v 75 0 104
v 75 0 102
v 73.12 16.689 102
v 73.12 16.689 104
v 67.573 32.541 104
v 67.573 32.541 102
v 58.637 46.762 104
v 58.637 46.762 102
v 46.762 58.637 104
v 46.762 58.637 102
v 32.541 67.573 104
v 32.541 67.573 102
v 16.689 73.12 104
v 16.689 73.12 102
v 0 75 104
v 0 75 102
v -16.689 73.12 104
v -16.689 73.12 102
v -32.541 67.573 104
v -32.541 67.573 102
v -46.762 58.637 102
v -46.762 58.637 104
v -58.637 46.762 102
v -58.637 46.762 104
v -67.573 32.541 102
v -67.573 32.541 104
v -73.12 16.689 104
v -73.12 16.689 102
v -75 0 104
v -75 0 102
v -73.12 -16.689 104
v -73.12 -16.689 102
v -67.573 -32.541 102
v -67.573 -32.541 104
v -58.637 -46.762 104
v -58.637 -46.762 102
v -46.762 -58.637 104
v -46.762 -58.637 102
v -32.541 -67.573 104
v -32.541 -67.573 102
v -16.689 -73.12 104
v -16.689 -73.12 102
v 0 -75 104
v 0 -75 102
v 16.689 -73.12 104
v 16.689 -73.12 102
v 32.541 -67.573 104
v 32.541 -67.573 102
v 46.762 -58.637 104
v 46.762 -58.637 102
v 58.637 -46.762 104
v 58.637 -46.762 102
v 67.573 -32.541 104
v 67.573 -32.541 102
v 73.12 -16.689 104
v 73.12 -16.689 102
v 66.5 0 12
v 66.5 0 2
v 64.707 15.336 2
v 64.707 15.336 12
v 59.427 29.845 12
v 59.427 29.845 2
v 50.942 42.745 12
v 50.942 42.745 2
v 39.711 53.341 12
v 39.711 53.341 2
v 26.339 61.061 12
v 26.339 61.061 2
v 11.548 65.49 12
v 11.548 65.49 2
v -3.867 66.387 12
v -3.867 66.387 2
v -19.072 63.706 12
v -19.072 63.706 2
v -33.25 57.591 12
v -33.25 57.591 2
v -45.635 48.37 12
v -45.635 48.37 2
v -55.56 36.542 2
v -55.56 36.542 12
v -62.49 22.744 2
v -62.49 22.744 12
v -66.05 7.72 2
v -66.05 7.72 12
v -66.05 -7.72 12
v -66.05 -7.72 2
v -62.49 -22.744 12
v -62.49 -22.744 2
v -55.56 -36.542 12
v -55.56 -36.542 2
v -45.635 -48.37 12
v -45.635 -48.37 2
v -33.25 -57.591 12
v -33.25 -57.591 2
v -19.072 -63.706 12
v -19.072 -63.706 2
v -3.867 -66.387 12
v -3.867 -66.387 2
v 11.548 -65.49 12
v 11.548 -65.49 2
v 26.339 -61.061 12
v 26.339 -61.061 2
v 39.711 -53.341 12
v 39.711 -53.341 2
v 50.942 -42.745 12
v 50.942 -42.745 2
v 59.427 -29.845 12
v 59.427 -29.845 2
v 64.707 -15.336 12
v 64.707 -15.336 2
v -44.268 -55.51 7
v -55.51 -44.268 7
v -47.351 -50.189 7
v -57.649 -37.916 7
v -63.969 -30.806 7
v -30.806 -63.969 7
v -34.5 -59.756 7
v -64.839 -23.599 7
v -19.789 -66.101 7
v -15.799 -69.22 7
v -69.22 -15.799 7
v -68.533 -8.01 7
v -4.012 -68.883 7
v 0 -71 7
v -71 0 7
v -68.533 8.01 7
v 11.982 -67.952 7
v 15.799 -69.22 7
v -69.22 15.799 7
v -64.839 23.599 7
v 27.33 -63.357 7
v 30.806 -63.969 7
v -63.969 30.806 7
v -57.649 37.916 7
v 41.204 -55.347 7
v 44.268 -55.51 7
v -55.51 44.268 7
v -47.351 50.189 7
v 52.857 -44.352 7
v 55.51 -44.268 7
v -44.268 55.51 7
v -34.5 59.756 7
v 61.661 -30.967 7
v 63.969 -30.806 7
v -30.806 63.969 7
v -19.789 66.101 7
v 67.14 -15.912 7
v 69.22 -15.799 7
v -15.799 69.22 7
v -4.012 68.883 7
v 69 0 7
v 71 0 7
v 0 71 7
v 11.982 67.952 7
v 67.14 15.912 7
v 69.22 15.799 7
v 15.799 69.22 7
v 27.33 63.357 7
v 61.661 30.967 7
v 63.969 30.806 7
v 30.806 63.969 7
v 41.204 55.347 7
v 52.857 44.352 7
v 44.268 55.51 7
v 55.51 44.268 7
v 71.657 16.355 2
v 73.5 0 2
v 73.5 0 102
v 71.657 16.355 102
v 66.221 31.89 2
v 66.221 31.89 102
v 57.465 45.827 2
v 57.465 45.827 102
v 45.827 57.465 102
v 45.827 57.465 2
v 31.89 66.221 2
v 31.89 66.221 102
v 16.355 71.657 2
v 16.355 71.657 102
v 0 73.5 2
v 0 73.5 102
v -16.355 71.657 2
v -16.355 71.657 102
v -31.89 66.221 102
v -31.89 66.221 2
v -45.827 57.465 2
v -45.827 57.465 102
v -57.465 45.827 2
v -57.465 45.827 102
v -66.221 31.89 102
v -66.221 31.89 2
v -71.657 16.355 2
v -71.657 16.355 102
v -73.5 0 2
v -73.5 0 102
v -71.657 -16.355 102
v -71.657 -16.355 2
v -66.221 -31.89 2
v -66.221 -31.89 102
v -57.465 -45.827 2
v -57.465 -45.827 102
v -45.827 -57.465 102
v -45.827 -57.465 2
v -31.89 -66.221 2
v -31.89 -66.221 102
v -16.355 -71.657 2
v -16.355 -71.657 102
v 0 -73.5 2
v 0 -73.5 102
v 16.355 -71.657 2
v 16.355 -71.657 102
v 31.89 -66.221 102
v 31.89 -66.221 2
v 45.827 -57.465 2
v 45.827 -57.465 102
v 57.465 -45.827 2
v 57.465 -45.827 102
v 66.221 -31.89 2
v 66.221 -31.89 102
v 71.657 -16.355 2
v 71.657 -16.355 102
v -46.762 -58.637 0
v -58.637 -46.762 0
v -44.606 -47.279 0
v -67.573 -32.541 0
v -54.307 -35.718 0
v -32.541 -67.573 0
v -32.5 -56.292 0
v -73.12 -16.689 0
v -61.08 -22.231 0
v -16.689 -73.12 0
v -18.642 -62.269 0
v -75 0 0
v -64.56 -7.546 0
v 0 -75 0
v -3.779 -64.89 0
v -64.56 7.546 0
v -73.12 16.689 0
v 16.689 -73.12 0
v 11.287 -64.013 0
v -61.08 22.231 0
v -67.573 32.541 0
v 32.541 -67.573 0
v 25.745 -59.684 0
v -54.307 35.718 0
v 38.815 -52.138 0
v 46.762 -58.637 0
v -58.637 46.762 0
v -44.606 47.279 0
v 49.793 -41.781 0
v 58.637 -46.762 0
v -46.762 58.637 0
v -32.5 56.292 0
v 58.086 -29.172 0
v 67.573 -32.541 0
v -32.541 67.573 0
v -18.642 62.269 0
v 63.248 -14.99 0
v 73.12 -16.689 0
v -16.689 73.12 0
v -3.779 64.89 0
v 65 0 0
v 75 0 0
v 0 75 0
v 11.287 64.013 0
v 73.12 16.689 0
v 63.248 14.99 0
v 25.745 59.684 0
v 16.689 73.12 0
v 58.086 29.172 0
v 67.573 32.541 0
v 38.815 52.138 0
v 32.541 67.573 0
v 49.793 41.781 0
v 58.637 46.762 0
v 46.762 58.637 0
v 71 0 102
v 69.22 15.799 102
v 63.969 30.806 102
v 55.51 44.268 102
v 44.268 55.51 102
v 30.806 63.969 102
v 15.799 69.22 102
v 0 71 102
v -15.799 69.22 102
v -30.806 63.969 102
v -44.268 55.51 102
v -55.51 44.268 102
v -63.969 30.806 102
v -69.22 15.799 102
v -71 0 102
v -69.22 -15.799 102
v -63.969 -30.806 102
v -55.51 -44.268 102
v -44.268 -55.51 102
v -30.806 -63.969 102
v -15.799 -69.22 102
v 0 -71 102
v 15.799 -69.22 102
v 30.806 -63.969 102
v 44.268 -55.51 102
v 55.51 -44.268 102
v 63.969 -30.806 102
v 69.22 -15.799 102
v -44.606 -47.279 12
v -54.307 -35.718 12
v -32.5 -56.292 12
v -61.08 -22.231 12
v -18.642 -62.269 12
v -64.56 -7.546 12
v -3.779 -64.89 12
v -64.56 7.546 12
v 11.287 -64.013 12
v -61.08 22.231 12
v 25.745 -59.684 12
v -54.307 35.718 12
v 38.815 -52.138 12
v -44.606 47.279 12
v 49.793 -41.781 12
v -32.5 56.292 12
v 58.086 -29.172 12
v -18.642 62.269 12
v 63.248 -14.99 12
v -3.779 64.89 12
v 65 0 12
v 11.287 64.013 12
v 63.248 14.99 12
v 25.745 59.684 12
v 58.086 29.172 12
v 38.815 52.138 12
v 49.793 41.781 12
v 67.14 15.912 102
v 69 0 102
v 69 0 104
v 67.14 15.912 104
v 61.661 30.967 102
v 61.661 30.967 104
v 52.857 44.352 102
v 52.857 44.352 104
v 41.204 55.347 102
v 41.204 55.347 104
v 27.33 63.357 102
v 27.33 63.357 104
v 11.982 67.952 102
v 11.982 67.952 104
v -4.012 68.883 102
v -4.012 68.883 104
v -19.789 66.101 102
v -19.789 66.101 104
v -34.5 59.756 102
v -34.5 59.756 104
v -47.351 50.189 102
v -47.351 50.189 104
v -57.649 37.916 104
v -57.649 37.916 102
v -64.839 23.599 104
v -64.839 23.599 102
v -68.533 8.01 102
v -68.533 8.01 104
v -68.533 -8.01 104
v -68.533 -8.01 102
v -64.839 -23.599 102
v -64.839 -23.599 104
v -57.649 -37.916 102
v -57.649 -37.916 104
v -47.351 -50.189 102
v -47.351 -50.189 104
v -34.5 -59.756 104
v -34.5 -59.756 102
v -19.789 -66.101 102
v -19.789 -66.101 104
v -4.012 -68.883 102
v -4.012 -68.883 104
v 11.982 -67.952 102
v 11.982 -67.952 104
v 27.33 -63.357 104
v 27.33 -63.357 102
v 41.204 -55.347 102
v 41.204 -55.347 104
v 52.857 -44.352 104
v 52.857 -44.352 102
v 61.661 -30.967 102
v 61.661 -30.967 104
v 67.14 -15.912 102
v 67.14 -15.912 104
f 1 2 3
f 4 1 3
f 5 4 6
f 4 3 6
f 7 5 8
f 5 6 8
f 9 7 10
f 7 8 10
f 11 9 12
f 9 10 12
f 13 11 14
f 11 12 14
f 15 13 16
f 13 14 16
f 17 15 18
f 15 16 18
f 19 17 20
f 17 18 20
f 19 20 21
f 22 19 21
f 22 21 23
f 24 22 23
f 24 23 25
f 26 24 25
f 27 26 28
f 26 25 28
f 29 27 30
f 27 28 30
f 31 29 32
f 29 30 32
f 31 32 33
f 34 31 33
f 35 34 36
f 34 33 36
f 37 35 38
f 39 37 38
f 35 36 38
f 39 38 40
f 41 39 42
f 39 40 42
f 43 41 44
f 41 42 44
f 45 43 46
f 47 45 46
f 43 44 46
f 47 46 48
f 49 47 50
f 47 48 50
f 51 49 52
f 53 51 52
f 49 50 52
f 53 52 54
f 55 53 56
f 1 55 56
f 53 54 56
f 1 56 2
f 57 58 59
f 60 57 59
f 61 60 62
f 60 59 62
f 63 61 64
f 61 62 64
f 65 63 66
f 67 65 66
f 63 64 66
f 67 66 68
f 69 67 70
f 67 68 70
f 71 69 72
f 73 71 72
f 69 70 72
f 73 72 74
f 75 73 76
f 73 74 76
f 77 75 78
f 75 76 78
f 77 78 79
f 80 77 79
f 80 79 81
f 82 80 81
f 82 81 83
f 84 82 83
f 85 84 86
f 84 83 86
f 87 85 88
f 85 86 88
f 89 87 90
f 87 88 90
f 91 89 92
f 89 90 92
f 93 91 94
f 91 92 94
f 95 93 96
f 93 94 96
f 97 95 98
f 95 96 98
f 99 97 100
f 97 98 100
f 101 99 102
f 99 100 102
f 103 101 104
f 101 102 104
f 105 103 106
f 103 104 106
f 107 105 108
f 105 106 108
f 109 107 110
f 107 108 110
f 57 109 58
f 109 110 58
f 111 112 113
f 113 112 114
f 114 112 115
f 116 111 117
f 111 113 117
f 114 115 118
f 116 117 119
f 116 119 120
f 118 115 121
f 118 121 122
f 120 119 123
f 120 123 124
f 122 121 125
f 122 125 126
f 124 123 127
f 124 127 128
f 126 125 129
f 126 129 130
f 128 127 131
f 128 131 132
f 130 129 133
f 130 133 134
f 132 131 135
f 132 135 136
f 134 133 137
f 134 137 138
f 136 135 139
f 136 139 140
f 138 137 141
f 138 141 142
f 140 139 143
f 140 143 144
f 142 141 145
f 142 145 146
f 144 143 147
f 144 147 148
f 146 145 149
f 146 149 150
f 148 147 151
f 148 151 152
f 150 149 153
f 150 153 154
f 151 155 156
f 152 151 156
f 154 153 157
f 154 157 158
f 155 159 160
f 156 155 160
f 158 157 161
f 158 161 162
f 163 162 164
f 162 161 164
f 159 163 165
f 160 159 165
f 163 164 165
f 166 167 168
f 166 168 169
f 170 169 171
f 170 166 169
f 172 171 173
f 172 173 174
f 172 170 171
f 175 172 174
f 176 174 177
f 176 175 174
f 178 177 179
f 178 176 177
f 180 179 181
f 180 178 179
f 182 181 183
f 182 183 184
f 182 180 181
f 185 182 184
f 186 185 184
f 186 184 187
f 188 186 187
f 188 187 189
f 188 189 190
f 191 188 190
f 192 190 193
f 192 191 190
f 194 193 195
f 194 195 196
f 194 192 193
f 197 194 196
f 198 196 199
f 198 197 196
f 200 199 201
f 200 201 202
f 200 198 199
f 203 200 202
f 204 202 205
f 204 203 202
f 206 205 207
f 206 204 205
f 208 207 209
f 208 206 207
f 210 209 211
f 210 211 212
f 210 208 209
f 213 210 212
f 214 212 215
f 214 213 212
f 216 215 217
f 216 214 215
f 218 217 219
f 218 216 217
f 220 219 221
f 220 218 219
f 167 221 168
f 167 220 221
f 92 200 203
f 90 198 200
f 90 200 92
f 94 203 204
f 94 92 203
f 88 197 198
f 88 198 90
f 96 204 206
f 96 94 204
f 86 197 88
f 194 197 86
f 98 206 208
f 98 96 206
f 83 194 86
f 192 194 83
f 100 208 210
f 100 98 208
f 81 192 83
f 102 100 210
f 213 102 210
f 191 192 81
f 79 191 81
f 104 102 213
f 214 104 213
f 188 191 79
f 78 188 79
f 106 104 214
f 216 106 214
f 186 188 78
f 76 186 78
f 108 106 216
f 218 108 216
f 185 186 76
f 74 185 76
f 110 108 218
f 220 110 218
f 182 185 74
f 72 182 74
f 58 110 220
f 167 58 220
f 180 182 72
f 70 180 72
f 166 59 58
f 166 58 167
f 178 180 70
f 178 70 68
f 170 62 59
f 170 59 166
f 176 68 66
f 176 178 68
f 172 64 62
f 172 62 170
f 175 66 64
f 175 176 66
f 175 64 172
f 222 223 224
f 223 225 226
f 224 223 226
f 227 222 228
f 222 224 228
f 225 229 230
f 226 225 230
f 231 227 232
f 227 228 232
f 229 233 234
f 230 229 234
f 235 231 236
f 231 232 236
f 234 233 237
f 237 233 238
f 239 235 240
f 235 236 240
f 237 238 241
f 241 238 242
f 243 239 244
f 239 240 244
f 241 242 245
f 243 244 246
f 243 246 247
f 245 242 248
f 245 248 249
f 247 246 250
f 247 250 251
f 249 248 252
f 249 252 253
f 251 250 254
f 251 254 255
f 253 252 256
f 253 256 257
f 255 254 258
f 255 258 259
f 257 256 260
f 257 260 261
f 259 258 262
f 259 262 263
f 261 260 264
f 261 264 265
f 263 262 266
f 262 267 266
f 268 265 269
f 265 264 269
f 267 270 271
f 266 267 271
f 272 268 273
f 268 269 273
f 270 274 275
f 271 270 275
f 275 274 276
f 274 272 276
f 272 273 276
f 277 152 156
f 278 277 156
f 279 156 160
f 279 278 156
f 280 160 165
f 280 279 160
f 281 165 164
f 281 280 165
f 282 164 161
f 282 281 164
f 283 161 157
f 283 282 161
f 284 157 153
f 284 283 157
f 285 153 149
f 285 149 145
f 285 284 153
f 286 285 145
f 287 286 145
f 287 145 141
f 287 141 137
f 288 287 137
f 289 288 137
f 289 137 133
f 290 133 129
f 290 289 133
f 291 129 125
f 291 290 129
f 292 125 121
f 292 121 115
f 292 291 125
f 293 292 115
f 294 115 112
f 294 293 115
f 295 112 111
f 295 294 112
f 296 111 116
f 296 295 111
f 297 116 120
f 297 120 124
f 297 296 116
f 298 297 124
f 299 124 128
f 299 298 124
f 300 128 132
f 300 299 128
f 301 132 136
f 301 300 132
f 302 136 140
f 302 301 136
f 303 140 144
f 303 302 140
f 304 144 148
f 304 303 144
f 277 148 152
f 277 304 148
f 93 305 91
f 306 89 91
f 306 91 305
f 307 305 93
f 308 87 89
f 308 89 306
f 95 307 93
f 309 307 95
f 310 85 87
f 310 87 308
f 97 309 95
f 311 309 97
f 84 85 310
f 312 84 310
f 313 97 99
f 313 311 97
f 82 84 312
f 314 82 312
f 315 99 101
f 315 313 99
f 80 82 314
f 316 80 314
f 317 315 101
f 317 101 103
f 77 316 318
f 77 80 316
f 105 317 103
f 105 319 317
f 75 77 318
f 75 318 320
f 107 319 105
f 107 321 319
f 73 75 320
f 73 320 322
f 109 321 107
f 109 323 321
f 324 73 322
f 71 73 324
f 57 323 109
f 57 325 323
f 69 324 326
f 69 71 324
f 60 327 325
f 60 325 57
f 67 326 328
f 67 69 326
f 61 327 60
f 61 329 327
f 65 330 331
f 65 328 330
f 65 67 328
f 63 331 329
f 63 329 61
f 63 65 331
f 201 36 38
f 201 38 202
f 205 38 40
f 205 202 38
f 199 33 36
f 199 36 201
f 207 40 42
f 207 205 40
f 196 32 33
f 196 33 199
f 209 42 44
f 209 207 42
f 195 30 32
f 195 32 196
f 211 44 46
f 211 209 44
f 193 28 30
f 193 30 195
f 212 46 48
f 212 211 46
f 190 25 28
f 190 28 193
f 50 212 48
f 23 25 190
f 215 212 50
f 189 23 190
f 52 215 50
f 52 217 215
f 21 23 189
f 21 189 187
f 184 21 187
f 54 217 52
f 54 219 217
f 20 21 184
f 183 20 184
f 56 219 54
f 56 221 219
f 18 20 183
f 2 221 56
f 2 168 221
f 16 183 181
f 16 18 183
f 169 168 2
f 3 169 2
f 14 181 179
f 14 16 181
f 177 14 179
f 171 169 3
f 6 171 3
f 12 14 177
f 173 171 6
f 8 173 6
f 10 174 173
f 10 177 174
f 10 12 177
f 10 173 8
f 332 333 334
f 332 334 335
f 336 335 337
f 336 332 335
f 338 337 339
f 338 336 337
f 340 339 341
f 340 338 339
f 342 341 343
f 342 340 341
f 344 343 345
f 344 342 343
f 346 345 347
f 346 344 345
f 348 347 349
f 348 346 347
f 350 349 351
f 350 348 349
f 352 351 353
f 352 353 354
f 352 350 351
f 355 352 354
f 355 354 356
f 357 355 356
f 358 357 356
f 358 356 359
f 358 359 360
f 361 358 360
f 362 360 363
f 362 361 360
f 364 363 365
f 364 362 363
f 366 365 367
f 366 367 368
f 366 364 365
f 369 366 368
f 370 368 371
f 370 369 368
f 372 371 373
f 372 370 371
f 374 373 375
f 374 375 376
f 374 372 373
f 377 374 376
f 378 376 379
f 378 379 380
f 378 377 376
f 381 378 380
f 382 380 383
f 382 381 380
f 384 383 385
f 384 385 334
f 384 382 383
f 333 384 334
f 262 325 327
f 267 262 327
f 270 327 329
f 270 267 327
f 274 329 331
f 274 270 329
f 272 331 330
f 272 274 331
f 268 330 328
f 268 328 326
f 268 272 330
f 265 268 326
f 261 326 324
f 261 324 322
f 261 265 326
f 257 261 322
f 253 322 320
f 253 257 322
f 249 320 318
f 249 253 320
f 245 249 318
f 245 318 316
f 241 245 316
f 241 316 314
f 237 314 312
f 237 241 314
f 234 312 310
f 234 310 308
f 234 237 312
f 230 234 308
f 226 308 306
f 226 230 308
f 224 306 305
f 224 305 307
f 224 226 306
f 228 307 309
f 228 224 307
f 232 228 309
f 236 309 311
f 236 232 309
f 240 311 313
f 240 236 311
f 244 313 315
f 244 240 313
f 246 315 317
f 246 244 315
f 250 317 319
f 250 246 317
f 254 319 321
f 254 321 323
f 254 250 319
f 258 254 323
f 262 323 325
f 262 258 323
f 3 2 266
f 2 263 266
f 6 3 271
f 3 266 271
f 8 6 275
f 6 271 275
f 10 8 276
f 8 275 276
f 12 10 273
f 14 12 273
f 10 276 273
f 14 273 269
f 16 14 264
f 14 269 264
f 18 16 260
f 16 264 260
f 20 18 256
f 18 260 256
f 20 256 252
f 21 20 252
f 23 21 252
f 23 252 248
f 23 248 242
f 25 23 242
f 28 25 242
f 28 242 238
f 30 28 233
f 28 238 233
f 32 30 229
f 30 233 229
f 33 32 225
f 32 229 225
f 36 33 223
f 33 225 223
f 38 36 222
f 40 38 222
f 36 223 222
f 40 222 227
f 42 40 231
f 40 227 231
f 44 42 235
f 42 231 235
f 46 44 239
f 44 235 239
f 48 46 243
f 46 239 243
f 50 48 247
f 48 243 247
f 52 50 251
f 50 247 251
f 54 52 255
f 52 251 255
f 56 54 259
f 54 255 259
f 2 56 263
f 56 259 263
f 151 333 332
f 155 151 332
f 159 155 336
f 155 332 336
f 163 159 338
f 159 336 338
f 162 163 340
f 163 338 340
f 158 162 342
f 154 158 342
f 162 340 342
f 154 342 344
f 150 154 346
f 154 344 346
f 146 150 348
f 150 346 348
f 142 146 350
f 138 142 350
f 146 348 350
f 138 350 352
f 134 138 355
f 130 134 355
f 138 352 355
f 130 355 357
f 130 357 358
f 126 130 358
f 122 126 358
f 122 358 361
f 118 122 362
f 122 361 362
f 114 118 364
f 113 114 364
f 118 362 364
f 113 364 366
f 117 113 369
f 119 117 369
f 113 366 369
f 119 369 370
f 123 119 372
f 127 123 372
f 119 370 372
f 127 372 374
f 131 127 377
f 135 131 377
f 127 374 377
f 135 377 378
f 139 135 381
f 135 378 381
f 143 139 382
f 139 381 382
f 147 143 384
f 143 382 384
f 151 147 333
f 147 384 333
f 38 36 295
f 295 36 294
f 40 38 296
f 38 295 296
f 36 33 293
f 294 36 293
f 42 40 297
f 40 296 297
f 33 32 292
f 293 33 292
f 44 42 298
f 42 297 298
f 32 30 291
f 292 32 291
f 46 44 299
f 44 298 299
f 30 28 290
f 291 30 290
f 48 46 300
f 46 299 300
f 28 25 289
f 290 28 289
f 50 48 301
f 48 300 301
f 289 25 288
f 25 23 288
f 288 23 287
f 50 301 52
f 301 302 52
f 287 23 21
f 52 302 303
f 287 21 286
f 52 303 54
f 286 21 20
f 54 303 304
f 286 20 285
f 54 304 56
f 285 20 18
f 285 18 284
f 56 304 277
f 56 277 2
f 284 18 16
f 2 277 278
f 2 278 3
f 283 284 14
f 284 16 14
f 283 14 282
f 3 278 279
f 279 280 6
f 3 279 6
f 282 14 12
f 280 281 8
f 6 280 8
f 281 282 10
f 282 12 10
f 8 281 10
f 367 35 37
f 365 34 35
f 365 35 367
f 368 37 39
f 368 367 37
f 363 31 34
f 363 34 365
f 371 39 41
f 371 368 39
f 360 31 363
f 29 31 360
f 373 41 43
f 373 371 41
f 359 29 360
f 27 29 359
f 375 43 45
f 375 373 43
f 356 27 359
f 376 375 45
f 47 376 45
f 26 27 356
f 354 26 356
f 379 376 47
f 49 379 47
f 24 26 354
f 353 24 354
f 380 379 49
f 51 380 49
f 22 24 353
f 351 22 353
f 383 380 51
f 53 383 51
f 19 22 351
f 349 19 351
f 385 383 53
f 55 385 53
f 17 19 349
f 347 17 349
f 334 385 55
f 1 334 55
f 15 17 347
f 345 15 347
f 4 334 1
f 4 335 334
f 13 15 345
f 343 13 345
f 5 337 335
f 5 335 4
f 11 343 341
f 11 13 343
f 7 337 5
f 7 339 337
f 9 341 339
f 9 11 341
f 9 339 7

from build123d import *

# Parameters (mm, degrees)
F0_R     = 75
F0_R_2   = 65
F1_DEPTH = 2
F2_R     = 66.5
F2_R_2   = 65
F3_DEPTH = 10
F2_R_3   = 75
F2_R_4   = 73.5
F4_DEPTH = 100
F5_R     = 75
F5_R_2   = 71
F5_R_3   = 69
F6_DEPTH = 2
F7_DEPTH = 95


with BuildPart() as f1:
    # F0 (on Top) → F1 (new body)
    with BuildSketch(Plane.XY):
        Circle(F0_R)
        Circle(F0_R_2, mode=Mode.SUBTRACT)
    extrude(amount=F1_DEPTH)

    # F2 (on face) → F3 (join)
    with BuildSketch(Plane.XY.offset(2)):
        Circle(F2_R)
        Circle(F2_R_2, mode=Mode.SUBTRACT)
    extrude(amount=F3_DEPTH)

    # F2 (on face) → F4 (join)
    with BuildSketch(Plane.XY.offset(2)):
        Circle(F2_R_3)
        Circle(F2_R_4, mode=Mode.SUBTRACT)
    extrude(amount=F4_DEPTH)


with BuildPart() as f6:
    # F5 (on face) → F6 (new body)
    with BuildSketch(Plane.XY.offset(102)):
        Circle(F5_R)
        Circle(F5_R_2, mode=Mode.SUBTRACT)
        Circle(F5_R_2)
        Circle(F5_R_3, mode=Mode.SUBTRACT)
    extrude(amount=F6_DEPTH)

    # F5 (on face) → F7 (join)
    with BuildSketch(Plane.XY.offset(102)):
        Circle(F5_R_2)
        Circle(F5_R_3, mode=Mode.SUBTRACT)
    extrude(amount=-F7_DEPTH)


solid = Compound([f1.part, f6.part])
